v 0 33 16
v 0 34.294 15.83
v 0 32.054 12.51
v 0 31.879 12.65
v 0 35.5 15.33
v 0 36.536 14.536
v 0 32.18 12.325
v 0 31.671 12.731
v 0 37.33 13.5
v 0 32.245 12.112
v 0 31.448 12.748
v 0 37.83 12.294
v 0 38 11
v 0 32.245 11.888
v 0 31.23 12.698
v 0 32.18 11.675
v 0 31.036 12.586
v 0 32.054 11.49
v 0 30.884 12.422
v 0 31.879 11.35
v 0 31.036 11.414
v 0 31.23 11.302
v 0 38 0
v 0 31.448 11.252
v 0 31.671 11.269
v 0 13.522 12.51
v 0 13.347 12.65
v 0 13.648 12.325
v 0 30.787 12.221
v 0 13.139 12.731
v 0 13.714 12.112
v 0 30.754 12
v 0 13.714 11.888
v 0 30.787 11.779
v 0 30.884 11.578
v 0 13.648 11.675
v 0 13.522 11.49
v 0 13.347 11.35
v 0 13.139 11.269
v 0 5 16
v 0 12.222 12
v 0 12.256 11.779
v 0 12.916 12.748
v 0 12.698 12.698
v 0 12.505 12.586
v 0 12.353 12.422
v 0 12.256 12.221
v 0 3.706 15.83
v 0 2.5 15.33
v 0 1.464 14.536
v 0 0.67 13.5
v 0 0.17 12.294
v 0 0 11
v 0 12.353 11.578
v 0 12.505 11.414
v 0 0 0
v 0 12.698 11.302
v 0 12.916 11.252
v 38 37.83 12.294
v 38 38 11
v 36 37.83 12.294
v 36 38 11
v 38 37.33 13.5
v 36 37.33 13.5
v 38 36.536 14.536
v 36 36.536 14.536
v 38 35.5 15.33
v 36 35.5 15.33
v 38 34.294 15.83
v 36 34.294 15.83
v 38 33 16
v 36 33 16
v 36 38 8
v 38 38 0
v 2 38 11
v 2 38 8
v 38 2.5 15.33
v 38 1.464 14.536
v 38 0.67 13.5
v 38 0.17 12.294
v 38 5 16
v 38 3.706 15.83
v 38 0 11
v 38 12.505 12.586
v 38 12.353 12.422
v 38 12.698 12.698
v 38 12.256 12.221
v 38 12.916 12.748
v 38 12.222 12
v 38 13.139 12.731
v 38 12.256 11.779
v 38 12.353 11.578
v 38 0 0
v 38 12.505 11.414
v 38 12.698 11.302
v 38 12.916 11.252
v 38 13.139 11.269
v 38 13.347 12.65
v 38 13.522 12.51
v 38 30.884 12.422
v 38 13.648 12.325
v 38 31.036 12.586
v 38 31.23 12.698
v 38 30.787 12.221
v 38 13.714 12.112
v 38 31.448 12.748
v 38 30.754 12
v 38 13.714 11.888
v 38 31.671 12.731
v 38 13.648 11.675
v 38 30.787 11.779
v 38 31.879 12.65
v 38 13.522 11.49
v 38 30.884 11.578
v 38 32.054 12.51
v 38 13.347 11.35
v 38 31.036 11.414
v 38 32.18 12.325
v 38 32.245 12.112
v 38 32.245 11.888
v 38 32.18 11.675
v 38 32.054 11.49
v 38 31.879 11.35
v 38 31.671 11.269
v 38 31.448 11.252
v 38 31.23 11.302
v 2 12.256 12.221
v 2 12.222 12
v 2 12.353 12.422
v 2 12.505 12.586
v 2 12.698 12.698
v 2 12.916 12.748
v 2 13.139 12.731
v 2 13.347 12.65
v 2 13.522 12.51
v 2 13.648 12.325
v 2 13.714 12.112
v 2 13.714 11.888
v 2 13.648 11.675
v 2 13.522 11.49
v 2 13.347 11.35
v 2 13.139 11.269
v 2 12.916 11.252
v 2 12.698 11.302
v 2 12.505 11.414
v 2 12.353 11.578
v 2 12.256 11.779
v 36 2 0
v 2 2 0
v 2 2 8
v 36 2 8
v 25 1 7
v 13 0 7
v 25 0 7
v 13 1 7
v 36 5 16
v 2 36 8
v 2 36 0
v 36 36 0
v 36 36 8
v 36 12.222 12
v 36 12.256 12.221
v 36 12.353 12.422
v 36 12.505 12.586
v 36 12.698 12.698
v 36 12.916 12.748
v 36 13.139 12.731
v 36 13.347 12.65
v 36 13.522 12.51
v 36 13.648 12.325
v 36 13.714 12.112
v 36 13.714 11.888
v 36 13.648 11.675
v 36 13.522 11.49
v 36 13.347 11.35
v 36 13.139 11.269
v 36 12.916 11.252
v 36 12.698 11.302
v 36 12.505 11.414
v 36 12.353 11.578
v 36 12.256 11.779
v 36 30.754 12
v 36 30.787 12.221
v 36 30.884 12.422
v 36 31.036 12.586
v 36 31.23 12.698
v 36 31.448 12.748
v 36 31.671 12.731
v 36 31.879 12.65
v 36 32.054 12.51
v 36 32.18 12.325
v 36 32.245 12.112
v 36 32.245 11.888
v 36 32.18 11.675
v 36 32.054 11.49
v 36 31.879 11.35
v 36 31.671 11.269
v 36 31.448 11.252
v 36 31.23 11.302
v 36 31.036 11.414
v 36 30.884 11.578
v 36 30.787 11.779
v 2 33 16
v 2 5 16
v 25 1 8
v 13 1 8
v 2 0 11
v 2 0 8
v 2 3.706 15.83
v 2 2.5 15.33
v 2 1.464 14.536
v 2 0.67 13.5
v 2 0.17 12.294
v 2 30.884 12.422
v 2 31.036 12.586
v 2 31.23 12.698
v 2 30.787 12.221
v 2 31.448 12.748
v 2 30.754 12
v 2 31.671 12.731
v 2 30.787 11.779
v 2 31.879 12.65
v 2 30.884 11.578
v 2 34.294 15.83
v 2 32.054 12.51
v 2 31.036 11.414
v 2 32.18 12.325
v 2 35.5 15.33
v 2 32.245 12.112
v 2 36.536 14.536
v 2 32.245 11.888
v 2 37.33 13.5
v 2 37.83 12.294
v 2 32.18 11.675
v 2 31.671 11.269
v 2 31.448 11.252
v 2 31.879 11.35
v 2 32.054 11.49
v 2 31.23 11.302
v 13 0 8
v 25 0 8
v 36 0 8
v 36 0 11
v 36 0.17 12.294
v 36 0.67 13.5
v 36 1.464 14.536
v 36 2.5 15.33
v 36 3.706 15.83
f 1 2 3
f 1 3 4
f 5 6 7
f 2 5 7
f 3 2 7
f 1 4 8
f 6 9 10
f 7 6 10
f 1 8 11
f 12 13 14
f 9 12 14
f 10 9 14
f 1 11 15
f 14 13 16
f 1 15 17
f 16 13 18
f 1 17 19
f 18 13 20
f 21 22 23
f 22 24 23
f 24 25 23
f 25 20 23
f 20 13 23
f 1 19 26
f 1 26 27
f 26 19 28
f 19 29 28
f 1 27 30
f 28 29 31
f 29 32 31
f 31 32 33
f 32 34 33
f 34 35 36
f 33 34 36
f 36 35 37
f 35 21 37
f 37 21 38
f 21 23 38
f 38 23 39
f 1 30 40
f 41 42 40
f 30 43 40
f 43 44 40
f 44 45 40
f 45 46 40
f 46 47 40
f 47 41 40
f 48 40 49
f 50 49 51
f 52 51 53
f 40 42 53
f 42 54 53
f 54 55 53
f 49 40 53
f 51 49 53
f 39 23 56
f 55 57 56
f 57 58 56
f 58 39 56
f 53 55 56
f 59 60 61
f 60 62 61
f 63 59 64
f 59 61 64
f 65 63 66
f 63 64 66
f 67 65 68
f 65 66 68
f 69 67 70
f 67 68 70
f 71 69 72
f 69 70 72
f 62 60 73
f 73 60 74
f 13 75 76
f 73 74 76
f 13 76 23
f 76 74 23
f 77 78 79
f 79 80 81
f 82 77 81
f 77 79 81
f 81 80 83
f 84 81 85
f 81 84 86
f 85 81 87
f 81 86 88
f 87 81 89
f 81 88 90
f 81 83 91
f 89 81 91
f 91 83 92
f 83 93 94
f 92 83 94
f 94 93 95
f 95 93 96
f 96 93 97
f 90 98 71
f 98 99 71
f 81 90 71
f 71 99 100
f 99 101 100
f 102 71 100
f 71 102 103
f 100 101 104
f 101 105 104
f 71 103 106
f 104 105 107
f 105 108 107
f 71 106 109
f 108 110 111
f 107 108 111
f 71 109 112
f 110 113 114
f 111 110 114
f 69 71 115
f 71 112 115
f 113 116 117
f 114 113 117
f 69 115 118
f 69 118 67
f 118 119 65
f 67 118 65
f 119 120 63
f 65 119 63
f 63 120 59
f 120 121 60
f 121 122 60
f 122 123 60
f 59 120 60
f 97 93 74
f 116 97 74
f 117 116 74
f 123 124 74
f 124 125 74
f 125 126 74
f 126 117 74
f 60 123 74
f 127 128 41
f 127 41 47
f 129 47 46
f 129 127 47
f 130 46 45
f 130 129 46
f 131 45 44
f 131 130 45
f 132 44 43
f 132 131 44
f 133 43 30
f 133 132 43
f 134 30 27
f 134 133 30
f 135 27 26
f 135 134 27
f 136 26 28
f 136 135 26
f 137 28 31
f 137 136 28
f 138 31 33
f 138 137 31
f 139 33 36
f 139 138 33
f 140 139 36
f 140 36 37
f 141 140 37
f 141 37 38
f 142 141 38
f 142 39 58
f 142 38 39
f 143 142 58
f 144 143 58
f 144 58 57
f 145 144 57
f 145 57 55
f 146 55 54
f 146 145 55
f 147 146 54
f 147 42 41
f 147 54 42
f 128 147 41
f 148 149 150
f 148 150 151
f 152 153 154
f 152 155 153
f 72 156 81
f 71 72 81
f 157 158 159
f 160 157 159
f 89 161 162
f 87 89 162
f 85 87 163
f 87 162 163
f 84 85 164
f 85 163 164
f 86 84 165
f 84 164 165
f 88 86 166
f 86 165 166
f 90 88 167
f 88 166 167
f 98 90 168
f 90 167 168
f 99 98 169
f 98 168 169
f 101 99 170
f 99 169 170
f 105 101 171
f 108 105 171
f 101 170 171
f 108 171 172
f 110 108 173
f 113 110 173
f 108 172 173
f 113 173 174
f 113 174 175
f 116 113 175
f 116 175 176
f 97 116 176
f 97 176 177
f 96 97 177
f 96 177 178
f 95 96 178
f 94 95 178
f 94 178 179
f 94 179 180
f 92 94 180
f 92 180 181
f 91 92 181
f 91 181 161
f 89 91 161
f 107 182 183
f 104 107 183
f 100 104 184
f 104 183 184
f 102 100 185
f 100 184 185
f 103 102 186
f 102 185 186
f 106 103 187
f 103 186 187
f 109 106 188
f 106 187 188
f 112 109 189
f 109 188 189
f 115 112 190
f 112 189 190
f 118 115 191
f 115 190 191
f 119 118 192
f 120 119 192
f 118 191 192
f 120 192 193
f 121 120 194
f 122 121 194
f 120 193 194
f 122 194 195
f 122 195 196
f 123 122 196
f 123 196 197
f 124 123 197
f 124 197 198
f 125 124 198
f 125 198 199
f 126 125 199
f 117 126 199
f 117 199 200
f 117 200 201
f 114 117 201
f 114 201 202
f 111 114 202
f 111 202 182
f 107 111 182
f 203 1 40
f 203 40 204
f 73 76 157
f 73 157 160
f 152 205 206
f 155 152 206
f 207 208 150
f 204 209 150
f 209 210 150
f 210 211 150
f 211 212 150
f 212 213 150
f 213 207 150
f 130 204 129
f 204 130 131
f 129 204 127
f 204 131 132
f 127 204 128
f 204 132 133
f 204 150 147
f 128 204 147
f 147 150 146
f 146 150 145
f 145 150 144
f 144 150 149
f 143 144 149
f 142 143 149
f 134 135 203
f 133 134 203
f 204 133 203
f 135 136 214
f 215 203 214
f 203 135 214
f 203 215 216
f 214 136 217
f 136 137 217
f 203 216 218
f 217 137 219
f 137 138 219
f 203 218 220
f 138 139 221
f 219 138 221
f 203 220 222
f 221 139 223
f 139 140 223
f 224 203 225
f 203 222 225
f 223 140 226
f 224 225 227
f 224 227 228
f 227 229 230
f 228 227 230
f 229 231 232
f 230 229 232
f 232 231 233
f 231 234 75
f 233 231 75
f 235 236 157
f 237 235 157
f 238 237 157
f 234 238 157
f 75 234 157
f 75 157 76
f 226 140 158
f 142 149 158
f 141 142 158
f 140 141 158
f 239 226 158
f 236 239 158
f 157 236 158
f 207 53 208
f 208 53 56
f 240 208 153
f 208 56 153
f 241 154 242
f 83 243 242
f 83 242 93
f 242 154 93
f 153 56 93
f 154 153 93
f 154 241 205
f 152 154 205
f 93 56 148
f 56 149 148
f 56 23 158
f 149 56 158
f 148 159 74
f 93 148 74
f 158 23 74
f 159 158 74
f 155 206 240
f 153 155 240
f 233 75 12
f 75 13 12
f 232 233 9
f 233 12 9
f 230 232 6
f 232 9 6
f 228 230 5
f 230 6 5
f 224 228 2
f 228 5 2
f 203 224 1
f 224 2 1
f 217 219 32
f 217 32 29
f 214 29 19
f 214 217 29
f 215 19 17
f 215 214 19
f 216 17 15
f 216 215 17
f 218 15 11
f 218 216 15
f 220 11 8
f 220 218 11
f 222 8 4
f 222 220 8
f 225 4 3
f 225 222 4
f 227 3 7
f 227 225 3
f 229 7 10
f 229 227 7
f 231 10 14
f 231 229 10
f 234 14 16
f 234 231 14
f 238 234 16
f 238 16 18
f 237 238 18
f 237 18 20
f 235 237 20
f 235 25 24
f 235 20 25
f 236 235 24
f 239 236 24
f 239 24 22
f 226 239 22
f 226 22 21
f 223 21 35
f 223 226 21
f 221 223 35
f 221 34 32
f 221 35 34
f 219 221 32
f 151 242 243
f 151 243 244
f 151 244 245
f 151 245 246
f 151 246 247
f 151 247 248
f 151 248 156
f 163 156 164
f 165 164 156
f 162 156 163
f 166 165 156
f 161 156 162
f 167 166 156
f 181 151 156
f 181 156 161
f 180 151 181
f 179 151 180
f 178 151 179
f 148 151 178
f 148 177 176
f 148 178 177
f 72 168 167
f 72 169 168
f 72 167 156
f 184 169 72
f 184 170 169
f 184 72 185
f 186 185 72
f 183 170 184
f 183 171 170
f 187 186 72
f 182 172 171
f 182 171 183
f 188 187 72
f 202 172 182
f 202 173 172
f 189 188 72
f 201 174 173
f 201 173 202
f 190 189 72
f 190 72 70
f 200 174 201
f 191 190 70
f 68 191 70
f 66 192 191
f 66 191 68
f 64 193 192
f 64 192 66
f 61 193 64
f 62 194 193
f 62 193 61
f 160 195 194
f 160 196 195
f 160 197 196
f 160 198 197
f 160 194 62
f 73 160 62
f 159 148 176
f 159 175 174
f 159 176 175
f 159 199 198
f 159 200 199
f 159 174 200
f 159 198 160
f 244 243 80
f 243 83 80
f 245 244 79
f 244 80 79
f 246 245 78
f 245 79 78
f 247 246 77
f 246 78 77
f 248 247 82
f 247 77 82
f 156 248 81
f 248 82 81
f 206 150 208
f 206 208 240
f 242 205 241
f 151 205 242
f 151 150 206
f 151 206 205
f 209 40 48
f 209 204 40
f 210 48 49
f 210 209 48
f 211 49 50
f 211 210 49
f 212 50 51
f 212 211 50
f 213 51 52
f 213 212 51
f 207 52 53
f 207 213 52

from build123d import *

# Parameters (mm, degrees)
F0_W          = 38
F0_H          = 38
F0_W_2        = 34
F0_H_2        = 34
F1_DEPTH      = 8
F3_DEPTH      = 1
F5_DEPTH      = 8
F6_R          = 0.75
F7_DEPTH      = 50.7
F7_DEPTH_BACK = 53.4
F8_R          = 5


with BuildPart() as f1:
    # F0 (on Top) → F1 (new body)
    with BuildSketch(Plane.XY):
        with Locations((19, 19)):
            Rectangle(F0_W, F0_H)
        with Locations((19, 19)):
            Rectangle(F0_W_2, F0_H_2, mode=Mode.SUBTRACT)
    extrude(amount=F1_DEPTH)

    # F2 (on face) → F3 (cut)
    with BuildSketch(Plane.XY.offset(8)):
        Polygon((13, 0), (19, 0), (25, 0), (25, 1), (19, 1), (13, 1), align=None)
    extrude(amount=-F3_DEPTH, mode=Mode.SUBTRACT)

    # F4 (on face) → F5 (join)
    with BuildSketch(Plane.XY.offset(8)):
        Polygon((0, 38), (0, 0), (2, 0), (2, 2), (2, 36), (2, 38), align=None)
        Polygon((38, 38), (36, 38), (36, 36), (36, 2), (36, 0), (38, 0), align=None)
    extrude(amount=F5_DEPTH)

    # F6 (on face) → F7 (cut, two sides)
    with BuildSketch(Plane(origin=(36, 0, 0), x_dir=(0, -1, 0), z_dir=(-1, 0, 0))) as f7_sk:
        with Locations((-31.5038709193, 12)):
            Circle(F6_R)
        with Locations((-12.9723072276, 12)):
            Circle(F6_R)
    extrude(amount=-F7_DEPTH, mode=Mode.SUBTRACT)
    extrude(f7_sk.sketch, amount=F7_DEPTH_BACK, mode=Mode.SUBTRACT)

    # F8
    f8_edges = [f1.edges().sort_by_distance(p)[0] for p in [
        (1, 0, 16),
        (37, 0, 16),
        (37, 38, 16),
        (1, 38, 16),
    ]]
    fillet(f8_edges, radius=F8_R)


solid = f1.part
